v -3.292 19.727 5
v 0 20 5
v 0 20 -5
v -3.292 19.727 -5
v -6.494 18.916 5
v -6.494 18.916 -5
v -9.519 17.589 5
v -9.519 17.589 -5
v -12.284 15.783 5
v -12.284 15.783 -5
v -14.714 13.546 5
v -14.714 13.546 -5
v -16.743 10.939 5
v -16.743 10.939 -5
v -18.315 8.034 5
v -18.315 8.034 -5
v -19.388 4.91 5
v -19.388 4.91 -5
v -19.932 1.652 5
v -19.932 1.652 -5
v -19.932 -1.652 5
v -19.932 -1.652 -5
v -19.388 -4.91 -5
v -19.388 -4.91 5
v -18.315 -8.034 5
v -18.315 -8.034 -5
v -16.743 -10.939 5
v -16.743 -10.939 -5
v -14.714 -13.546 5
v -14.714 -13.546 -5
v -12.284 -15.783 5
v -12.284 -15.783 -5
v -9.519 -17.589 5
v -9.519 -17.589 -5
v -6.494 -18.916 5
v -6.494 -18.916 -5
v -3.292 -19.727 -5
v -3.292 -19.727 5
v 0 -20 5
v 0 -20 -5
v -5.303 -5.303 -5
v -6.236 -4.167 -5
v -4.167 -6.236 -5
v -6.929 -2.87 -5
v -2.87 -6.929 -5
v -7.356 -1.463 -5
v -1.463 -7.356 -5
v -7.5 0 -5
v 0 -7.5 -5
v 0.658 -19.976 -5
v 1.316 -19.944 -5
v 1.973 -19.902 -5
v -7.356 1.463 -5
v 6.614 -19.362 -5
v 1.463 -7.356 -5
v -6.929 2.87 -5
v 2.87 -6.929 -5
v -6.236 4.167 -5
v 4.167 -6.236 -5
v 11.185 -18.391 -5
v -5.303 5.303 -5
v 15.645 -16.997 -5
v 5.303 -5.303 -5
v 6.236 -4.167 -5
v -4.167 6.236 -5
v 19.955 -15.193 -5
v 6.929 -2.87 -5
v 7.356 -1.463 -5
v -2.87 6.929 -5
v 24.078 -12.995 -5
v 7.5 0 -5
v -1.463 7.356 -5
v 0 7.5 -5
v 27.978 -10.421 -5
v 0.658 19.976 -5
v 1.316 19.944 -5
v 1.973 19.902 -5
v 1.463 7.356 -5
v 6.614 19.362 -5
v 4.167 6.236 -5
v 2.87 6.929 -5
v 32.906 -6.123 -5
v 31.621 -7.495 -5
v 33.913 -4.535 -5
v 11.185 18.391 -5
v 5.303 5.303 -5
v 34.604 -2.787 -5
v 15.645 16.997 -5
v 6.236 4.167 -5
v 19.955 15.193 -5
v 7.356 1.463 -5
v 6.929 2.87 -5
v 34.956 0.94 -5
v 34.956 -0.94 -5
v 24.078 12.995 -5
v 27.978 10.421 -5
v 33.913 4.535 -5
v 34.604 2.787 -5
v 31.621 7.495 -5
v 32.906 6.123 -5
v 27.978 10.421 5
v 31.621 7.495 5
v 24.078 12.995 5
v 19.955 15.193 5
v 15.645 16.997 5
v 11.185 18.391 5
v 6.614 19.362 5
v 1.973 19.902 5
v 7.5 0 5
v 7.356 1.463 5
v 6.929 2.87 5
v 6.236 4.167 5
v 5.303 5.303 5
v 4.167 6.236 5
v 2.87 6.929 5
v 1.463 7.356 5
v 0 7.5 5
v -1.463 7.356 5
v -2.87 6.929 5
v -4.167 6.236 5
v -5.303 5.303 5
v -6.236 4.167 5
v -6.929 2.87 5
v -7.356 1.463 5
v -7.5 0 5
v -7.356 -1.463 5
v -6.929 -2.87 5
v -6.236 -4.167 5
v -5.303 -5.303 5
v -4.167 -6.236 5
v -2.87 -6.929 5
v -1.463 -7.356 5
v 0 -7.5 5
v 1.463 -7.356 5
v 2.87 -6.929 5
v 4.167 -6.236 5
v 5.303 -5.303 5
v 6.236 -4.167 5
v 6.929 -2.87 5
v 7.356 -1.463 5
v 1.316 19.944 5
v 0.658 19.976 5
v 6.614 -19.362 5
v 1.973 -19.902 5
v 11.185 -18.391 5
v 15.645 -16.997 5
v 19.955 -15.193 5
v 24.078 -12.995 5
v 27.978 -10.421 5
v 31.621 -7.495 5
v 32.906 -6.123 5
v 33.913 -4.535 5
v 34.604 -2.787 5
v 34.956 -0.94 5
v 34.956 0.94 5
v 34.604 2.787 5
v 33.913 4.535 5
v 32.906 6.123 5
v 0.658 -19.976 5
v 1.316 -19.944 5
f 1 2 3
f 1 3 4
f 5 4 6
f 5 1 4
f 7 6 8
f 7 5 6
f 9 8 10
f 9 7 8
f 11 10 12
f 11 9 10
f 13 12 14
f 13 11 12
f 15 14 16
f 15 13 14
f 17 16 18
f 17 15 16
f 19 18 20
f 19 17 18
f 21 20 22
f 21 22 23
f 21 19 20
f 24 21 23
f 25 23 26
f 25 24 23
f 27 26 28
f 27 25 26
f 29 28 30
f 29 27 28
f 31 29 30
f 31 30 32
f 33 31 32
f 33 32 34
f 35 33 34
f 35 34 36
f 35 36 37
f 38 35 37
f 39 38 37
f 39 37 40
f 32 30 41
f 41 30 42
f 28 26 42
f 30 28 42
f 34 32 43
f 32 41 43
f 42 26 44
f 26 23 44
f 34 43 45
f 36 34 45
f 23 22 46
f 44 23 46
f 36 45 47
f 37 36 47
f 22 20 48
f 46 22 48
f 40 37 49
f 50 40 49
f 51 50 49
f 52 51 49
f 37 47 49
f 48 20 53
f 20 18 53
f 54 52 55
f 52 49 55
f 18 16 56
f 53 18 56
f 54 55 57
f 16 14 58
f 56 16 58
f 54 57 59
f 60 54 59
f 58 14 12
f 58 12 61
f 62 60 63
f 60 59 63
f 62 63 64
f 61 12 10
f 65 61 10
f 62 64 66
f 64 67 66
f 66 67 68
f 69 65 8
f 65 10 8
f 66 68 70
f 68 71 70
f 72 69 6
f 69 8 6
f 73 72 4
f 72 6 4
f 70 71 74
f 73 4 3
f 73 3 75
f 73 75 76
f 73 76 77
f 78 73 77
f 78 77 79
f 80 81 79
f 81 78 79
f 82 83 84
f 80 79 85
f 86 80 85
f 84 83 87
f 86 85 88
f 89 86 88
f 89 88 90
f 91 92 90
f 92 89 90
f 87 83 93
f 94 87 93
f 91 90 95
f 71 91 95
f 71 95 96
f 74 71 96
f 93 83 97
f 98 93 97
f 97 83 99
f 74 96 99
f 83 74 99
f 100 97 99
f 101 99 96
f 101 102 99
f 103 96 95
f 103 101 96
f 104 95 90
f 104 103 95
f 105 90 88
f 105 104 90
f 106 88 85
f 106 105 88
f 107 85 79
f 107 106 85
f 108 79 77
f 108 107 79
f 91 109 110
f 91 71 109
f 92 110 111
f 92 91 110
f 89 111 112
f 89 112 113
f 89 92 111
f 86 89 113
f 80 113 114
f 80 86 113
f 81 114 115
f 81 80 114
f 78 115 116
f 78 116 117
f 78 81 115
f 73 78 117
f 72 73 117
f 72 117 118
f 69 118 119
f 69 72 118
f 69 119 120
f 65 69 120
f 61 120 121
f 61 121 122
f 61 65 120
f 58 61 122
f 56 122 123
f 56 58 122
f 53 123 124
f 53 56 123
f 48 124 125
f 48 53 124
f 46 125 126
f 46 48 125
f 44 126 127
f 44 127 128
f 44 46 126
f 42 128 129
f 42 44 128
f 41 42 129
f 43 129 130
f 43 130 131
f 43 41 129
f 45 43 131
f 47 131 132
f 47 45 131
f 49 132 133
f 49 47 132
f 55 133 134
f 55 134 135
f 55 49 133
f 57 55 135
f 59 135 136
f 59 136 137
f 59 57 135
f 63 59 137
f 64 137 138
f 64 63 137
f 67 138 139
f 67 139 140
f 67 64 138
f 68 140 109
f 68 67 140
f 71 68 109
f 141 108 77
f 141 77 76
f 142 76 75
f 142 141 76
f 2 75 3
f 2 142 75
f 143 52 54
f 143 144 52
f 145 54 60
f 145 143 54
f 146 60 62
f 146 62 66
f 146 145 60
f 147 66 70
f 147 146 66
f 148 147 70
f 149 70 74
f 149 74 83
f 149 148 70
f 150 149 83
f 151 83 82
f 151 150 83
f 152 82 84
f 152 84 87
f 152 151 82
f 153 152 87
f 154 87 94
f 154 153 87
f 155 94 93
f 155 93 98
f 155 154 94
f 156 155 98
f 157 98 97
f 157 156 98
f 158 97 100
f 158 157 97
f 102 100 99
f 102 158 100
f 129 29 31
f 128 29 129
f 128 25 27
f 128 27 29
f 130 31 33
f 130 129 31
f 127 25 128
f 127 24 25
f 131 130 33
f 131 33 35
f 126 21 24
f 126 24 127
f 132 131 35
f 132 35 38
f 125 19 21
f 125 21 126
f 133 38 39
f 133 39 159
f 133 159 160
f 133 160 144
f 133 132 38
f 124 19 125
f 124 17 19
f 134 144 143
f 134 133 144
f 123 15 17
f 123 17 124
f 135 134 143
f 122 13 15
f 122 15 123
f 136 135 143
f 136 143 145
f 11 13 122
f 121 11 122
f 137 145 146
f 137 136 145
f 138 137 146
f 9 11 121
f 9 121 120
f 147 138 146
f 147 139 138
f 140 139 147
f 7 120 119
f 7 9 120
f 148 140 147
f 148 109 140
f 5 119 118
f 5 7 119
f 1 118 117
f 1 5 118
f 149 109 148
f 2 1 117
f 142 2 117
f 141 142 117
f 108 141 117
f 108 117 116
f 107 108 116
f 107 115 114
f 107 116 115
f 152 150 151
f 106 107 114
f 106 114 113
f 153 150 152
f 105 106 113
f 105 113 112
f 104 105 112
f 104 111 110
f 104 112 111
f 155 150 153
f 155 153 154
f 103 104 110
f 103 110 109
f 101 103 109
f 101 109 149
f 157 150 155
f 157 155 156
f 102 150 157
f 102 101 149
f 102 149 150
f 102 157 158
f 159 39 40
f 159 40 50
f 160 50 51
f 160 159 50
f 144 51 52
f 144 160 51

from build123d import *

# Parameters (mm, degrees)
SKETCH1_R           = 7.5
BOSS_EXTRUDE1_DEPTH = 5


with BuildPart() as part:
    # Sketch1 → Boss-Extrude1 (new, symmetric)
    with BuildSketch(Plane.XY):
        with BuildLine():
            ThreePointArc((31.620603921, 7.494504901), (17.82100855, 16.145486471), (1.973178454, 19.902426153))
            ThreePointArc((1.973178454, 19.902426153), (0.987071189, 19.960959504), (0, 20))
            ThreePointArc((0, 20), (-20, 0), (0, -20))
            ThreePointArc((0, -20), (0.987071189, -19.960959504), (1.973178454, -19.902426153))
            ThreePointArc((1.973178454, -19.902426153), (17.82100855, -16.145486471), (31.620603921, -7.494504901))
            ThreePointArc((31.620603921, -7.494504901), (35, 0), (31.620603921, 7.494504901))
        make_face()
        Circle(SKETCH1_R, mode=Mode.SUBTRACT)
    extrude(amount=BOSS_EXTRUDE1_DEPTH, both=True)


solid = part.part
